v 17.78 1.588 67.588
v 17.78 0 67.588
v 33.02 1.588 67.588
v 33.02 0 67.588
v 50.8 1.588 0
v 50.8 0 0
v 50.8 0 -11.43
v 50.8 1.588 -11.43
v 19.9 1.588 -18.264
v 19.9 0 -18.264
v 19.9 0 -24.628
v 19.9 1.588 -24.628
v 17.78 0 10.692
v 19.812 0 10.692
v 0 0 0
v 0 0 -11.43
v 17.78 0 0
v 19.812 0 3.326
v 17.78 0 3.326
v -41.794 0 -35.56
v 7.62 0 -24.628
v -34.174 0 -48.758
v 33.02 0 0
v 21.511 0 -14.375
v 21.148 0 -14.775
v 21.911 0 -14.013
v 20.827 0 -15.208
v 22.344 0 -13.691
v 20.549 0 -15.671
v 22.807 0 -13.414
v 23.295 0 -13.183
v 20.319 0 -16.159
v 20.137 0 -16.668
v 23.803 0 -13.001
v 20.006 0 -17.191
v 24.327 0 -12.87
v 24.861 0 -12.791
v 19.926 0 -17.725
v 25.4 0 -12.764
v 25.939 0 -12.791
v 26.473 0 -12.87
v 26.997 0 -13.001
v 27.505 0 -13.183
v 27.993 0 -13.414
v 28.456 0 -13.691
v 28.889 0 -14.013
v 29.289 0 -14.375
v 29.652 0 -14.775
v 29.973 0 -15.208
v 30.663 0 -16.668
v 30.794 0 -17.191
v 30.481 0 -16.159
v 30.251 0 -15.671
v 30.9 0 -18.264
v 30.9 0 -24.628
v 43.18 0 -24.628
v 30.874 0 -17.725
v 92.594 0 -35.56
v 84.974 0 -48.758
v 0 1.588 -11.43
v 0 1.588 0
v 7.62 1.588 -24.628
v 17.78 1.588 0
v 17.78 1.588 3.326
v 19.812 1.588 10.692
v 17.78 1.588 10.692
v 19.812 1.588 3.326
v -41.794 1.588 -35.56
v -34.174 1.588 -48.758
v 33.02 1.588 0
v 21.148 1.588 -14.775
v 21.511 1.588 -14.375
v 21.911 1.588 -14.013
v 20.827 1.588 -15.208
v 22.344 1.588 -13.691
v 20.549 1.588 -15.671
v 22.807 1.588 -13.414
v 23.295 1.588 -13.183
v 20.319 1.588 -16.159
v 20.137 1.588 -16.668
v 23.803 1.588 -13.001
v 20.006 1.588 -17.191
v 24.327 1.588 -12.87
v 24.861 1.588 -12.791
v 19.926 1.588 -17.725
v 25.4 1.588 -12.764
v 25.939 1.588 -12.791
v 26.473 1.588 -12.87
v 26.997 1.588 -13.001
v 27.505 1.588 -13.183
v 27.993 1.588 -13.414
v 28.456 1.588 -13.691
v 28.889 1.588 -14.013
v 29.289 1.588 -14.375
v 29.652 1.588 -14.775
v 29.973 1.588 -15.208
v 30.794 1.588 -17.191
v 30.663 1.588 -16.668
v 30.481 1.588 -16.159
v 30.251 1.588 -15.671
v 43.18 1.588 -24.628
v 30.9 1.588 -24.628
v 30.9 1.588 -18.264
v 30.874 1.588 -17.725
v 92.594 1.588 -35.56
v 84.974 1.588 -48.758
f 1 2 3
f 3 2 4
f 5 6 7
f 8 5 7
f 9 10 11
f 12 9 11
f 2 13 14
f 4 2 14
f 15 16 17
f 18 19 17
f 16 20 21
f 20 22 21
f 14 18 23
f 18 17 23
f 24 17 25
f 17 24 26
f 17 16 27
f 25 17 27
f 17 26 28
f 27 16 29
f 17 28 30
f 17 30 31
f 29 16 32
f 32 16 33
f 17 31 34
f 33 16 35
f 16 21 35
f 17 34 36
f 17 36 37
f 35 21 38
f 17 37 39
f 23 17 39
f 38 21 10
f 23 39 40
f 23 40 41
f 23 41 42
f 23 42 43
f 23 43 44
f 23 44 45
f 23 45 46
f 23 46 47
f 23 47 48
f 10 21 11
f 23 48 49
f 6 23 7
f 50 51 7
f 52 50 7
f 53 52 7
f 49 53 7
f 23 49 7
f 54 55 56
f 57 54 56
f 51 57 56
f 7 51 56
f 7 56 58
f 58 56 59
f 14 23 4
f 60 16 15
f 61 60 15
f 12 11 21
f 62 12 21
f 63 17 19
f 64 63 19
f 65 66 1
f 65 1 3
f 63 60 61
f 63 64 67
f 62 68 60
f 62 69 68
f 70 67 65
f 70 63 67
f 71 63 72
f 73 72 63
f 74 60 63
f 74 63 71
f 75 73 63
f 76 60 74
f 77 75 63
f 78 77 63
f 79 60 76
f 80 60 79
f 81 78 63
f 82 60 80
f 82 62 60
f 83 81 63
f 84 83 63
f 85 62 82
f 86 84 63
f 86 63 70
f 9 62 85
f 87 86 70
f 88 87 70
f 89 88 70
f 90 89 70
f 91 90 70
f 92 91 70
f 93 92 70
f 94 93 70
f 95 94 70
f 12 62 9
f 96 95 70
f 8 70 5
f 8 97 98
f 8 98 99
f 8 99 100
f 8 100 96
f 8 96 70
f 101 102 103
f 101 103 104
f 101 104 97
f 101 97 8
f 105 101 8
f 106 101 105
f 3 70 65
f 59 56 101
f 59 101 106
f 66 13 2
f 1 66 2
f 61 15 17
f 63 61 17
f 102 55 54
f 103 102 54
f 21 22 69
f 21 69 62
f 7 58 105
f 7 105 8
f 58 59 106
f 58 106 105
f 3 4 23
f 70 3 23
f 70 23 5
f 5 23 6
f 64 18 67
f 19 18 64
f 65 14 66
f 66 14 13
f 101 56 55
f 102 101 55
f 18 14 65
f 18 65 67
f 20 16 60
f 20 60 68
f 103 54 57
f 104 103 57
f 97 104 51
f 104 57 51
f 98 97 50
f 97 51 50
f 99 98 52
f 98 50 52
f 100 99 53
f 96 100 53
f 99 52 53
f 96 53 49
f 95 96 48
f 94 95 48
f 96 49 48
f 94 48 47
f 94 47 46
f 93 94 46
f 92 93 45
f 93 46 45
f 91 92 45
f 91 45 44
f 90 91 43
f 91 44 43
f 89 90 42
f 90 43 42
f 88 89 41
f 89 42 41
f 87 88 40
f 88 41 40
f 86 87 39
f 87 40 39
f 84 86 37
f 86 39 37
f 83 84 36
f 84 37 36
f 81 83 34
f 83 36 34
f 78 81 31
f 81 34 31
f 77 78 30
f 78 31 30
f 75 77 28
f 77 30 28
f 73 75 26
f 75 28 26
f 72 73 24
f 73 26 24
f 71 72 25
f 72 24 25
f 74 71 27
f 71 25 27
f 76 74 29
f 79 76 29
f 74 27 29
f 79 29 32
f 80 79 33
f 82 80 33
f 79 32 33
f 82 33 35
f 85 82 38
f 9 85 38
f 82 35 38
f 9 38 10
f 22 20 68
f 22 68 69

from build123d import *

# Parameters (mm, degrees)
SKETCH1_W           = 15.24
SKETCH1_H           = 19.327878735
SKETCH1_H_2         = 48.26
BOSS_EXTRUDE2_DEPTH = 1.5875
SKETCH6_W           = 2.032
SKETCH6_H           = 7.366
CUT_EXTRUDE4_DEPTH  = 2.54


with BuildPart() as part:
    # Sketch1 → Boss-Extrude2 (new body)
    with BuildSketch(Plane(origin=(0, 0, 0), x_dir=(1, 0, 0), z_dir=(0, 1, 0))):
        Polygon((50.8, 11.43), (0, 11.43), (0, 0), (17.78, 0), (33.02, 0), (50.8, 0), align=None)
        with BuildLine():
            Line((7.62, 24.628227154), (0, 11.43))
            Line((0, 11.43), (50.8, 11.43))
            Line((50.8, 11.43), (43.18, 24.628227154))
            Line((43.18, 24.628227154), (30.9, 24.628227154))
            Line((30.9, 24.628227154), (30.9, 18.264121265))
            ThreePointArc((30.9, 18.264121265), (25.4, 12.764121265), (19.9, 18.264121265))
            Line((19.9, 18.264121265), (19.9, 24.628227154))
            Line((19.9, 24.628227154), (7.62, 24.628227154))
        make_face()
        with Locations((25.4, -9.663939368)):
            Rectangle(SKETCH1_W, SKETCH1_H)
        Polygon((-41.794385987, 35.56), (-34.174385987, 48.758227154), (7.62, 24.628227154), (0, 11.43), align=None)
        with Locations((25.4, -43.457878735)):
            Rectangle(SKETCH1_W, SKETCH1_H_2)
        Polygon((84.974385987, 48.758227154), (92.594385987, 35.56), (50.8, 11.43), (43.18, 24.628227154), align=None)
    extrude(amount=BOSS_EXTRUDE2_DEPTH)

    # Sketch6 → Cut-Extrude4 (cut)
    with BuildSketch(Plane(origin=(0, 0, 0), x_dir=(-1, 0, 0), z_dir=(0, -1, 0))):
        with Locations((-18.796, -7.008878735)):
            Rectangle(SKETCH6_W, SKETCH6_H)
    extrude(amount=-CUT_EXTRUDE4_DEPTH, mode=Mode.SUBTRACT)


solid = part.part
